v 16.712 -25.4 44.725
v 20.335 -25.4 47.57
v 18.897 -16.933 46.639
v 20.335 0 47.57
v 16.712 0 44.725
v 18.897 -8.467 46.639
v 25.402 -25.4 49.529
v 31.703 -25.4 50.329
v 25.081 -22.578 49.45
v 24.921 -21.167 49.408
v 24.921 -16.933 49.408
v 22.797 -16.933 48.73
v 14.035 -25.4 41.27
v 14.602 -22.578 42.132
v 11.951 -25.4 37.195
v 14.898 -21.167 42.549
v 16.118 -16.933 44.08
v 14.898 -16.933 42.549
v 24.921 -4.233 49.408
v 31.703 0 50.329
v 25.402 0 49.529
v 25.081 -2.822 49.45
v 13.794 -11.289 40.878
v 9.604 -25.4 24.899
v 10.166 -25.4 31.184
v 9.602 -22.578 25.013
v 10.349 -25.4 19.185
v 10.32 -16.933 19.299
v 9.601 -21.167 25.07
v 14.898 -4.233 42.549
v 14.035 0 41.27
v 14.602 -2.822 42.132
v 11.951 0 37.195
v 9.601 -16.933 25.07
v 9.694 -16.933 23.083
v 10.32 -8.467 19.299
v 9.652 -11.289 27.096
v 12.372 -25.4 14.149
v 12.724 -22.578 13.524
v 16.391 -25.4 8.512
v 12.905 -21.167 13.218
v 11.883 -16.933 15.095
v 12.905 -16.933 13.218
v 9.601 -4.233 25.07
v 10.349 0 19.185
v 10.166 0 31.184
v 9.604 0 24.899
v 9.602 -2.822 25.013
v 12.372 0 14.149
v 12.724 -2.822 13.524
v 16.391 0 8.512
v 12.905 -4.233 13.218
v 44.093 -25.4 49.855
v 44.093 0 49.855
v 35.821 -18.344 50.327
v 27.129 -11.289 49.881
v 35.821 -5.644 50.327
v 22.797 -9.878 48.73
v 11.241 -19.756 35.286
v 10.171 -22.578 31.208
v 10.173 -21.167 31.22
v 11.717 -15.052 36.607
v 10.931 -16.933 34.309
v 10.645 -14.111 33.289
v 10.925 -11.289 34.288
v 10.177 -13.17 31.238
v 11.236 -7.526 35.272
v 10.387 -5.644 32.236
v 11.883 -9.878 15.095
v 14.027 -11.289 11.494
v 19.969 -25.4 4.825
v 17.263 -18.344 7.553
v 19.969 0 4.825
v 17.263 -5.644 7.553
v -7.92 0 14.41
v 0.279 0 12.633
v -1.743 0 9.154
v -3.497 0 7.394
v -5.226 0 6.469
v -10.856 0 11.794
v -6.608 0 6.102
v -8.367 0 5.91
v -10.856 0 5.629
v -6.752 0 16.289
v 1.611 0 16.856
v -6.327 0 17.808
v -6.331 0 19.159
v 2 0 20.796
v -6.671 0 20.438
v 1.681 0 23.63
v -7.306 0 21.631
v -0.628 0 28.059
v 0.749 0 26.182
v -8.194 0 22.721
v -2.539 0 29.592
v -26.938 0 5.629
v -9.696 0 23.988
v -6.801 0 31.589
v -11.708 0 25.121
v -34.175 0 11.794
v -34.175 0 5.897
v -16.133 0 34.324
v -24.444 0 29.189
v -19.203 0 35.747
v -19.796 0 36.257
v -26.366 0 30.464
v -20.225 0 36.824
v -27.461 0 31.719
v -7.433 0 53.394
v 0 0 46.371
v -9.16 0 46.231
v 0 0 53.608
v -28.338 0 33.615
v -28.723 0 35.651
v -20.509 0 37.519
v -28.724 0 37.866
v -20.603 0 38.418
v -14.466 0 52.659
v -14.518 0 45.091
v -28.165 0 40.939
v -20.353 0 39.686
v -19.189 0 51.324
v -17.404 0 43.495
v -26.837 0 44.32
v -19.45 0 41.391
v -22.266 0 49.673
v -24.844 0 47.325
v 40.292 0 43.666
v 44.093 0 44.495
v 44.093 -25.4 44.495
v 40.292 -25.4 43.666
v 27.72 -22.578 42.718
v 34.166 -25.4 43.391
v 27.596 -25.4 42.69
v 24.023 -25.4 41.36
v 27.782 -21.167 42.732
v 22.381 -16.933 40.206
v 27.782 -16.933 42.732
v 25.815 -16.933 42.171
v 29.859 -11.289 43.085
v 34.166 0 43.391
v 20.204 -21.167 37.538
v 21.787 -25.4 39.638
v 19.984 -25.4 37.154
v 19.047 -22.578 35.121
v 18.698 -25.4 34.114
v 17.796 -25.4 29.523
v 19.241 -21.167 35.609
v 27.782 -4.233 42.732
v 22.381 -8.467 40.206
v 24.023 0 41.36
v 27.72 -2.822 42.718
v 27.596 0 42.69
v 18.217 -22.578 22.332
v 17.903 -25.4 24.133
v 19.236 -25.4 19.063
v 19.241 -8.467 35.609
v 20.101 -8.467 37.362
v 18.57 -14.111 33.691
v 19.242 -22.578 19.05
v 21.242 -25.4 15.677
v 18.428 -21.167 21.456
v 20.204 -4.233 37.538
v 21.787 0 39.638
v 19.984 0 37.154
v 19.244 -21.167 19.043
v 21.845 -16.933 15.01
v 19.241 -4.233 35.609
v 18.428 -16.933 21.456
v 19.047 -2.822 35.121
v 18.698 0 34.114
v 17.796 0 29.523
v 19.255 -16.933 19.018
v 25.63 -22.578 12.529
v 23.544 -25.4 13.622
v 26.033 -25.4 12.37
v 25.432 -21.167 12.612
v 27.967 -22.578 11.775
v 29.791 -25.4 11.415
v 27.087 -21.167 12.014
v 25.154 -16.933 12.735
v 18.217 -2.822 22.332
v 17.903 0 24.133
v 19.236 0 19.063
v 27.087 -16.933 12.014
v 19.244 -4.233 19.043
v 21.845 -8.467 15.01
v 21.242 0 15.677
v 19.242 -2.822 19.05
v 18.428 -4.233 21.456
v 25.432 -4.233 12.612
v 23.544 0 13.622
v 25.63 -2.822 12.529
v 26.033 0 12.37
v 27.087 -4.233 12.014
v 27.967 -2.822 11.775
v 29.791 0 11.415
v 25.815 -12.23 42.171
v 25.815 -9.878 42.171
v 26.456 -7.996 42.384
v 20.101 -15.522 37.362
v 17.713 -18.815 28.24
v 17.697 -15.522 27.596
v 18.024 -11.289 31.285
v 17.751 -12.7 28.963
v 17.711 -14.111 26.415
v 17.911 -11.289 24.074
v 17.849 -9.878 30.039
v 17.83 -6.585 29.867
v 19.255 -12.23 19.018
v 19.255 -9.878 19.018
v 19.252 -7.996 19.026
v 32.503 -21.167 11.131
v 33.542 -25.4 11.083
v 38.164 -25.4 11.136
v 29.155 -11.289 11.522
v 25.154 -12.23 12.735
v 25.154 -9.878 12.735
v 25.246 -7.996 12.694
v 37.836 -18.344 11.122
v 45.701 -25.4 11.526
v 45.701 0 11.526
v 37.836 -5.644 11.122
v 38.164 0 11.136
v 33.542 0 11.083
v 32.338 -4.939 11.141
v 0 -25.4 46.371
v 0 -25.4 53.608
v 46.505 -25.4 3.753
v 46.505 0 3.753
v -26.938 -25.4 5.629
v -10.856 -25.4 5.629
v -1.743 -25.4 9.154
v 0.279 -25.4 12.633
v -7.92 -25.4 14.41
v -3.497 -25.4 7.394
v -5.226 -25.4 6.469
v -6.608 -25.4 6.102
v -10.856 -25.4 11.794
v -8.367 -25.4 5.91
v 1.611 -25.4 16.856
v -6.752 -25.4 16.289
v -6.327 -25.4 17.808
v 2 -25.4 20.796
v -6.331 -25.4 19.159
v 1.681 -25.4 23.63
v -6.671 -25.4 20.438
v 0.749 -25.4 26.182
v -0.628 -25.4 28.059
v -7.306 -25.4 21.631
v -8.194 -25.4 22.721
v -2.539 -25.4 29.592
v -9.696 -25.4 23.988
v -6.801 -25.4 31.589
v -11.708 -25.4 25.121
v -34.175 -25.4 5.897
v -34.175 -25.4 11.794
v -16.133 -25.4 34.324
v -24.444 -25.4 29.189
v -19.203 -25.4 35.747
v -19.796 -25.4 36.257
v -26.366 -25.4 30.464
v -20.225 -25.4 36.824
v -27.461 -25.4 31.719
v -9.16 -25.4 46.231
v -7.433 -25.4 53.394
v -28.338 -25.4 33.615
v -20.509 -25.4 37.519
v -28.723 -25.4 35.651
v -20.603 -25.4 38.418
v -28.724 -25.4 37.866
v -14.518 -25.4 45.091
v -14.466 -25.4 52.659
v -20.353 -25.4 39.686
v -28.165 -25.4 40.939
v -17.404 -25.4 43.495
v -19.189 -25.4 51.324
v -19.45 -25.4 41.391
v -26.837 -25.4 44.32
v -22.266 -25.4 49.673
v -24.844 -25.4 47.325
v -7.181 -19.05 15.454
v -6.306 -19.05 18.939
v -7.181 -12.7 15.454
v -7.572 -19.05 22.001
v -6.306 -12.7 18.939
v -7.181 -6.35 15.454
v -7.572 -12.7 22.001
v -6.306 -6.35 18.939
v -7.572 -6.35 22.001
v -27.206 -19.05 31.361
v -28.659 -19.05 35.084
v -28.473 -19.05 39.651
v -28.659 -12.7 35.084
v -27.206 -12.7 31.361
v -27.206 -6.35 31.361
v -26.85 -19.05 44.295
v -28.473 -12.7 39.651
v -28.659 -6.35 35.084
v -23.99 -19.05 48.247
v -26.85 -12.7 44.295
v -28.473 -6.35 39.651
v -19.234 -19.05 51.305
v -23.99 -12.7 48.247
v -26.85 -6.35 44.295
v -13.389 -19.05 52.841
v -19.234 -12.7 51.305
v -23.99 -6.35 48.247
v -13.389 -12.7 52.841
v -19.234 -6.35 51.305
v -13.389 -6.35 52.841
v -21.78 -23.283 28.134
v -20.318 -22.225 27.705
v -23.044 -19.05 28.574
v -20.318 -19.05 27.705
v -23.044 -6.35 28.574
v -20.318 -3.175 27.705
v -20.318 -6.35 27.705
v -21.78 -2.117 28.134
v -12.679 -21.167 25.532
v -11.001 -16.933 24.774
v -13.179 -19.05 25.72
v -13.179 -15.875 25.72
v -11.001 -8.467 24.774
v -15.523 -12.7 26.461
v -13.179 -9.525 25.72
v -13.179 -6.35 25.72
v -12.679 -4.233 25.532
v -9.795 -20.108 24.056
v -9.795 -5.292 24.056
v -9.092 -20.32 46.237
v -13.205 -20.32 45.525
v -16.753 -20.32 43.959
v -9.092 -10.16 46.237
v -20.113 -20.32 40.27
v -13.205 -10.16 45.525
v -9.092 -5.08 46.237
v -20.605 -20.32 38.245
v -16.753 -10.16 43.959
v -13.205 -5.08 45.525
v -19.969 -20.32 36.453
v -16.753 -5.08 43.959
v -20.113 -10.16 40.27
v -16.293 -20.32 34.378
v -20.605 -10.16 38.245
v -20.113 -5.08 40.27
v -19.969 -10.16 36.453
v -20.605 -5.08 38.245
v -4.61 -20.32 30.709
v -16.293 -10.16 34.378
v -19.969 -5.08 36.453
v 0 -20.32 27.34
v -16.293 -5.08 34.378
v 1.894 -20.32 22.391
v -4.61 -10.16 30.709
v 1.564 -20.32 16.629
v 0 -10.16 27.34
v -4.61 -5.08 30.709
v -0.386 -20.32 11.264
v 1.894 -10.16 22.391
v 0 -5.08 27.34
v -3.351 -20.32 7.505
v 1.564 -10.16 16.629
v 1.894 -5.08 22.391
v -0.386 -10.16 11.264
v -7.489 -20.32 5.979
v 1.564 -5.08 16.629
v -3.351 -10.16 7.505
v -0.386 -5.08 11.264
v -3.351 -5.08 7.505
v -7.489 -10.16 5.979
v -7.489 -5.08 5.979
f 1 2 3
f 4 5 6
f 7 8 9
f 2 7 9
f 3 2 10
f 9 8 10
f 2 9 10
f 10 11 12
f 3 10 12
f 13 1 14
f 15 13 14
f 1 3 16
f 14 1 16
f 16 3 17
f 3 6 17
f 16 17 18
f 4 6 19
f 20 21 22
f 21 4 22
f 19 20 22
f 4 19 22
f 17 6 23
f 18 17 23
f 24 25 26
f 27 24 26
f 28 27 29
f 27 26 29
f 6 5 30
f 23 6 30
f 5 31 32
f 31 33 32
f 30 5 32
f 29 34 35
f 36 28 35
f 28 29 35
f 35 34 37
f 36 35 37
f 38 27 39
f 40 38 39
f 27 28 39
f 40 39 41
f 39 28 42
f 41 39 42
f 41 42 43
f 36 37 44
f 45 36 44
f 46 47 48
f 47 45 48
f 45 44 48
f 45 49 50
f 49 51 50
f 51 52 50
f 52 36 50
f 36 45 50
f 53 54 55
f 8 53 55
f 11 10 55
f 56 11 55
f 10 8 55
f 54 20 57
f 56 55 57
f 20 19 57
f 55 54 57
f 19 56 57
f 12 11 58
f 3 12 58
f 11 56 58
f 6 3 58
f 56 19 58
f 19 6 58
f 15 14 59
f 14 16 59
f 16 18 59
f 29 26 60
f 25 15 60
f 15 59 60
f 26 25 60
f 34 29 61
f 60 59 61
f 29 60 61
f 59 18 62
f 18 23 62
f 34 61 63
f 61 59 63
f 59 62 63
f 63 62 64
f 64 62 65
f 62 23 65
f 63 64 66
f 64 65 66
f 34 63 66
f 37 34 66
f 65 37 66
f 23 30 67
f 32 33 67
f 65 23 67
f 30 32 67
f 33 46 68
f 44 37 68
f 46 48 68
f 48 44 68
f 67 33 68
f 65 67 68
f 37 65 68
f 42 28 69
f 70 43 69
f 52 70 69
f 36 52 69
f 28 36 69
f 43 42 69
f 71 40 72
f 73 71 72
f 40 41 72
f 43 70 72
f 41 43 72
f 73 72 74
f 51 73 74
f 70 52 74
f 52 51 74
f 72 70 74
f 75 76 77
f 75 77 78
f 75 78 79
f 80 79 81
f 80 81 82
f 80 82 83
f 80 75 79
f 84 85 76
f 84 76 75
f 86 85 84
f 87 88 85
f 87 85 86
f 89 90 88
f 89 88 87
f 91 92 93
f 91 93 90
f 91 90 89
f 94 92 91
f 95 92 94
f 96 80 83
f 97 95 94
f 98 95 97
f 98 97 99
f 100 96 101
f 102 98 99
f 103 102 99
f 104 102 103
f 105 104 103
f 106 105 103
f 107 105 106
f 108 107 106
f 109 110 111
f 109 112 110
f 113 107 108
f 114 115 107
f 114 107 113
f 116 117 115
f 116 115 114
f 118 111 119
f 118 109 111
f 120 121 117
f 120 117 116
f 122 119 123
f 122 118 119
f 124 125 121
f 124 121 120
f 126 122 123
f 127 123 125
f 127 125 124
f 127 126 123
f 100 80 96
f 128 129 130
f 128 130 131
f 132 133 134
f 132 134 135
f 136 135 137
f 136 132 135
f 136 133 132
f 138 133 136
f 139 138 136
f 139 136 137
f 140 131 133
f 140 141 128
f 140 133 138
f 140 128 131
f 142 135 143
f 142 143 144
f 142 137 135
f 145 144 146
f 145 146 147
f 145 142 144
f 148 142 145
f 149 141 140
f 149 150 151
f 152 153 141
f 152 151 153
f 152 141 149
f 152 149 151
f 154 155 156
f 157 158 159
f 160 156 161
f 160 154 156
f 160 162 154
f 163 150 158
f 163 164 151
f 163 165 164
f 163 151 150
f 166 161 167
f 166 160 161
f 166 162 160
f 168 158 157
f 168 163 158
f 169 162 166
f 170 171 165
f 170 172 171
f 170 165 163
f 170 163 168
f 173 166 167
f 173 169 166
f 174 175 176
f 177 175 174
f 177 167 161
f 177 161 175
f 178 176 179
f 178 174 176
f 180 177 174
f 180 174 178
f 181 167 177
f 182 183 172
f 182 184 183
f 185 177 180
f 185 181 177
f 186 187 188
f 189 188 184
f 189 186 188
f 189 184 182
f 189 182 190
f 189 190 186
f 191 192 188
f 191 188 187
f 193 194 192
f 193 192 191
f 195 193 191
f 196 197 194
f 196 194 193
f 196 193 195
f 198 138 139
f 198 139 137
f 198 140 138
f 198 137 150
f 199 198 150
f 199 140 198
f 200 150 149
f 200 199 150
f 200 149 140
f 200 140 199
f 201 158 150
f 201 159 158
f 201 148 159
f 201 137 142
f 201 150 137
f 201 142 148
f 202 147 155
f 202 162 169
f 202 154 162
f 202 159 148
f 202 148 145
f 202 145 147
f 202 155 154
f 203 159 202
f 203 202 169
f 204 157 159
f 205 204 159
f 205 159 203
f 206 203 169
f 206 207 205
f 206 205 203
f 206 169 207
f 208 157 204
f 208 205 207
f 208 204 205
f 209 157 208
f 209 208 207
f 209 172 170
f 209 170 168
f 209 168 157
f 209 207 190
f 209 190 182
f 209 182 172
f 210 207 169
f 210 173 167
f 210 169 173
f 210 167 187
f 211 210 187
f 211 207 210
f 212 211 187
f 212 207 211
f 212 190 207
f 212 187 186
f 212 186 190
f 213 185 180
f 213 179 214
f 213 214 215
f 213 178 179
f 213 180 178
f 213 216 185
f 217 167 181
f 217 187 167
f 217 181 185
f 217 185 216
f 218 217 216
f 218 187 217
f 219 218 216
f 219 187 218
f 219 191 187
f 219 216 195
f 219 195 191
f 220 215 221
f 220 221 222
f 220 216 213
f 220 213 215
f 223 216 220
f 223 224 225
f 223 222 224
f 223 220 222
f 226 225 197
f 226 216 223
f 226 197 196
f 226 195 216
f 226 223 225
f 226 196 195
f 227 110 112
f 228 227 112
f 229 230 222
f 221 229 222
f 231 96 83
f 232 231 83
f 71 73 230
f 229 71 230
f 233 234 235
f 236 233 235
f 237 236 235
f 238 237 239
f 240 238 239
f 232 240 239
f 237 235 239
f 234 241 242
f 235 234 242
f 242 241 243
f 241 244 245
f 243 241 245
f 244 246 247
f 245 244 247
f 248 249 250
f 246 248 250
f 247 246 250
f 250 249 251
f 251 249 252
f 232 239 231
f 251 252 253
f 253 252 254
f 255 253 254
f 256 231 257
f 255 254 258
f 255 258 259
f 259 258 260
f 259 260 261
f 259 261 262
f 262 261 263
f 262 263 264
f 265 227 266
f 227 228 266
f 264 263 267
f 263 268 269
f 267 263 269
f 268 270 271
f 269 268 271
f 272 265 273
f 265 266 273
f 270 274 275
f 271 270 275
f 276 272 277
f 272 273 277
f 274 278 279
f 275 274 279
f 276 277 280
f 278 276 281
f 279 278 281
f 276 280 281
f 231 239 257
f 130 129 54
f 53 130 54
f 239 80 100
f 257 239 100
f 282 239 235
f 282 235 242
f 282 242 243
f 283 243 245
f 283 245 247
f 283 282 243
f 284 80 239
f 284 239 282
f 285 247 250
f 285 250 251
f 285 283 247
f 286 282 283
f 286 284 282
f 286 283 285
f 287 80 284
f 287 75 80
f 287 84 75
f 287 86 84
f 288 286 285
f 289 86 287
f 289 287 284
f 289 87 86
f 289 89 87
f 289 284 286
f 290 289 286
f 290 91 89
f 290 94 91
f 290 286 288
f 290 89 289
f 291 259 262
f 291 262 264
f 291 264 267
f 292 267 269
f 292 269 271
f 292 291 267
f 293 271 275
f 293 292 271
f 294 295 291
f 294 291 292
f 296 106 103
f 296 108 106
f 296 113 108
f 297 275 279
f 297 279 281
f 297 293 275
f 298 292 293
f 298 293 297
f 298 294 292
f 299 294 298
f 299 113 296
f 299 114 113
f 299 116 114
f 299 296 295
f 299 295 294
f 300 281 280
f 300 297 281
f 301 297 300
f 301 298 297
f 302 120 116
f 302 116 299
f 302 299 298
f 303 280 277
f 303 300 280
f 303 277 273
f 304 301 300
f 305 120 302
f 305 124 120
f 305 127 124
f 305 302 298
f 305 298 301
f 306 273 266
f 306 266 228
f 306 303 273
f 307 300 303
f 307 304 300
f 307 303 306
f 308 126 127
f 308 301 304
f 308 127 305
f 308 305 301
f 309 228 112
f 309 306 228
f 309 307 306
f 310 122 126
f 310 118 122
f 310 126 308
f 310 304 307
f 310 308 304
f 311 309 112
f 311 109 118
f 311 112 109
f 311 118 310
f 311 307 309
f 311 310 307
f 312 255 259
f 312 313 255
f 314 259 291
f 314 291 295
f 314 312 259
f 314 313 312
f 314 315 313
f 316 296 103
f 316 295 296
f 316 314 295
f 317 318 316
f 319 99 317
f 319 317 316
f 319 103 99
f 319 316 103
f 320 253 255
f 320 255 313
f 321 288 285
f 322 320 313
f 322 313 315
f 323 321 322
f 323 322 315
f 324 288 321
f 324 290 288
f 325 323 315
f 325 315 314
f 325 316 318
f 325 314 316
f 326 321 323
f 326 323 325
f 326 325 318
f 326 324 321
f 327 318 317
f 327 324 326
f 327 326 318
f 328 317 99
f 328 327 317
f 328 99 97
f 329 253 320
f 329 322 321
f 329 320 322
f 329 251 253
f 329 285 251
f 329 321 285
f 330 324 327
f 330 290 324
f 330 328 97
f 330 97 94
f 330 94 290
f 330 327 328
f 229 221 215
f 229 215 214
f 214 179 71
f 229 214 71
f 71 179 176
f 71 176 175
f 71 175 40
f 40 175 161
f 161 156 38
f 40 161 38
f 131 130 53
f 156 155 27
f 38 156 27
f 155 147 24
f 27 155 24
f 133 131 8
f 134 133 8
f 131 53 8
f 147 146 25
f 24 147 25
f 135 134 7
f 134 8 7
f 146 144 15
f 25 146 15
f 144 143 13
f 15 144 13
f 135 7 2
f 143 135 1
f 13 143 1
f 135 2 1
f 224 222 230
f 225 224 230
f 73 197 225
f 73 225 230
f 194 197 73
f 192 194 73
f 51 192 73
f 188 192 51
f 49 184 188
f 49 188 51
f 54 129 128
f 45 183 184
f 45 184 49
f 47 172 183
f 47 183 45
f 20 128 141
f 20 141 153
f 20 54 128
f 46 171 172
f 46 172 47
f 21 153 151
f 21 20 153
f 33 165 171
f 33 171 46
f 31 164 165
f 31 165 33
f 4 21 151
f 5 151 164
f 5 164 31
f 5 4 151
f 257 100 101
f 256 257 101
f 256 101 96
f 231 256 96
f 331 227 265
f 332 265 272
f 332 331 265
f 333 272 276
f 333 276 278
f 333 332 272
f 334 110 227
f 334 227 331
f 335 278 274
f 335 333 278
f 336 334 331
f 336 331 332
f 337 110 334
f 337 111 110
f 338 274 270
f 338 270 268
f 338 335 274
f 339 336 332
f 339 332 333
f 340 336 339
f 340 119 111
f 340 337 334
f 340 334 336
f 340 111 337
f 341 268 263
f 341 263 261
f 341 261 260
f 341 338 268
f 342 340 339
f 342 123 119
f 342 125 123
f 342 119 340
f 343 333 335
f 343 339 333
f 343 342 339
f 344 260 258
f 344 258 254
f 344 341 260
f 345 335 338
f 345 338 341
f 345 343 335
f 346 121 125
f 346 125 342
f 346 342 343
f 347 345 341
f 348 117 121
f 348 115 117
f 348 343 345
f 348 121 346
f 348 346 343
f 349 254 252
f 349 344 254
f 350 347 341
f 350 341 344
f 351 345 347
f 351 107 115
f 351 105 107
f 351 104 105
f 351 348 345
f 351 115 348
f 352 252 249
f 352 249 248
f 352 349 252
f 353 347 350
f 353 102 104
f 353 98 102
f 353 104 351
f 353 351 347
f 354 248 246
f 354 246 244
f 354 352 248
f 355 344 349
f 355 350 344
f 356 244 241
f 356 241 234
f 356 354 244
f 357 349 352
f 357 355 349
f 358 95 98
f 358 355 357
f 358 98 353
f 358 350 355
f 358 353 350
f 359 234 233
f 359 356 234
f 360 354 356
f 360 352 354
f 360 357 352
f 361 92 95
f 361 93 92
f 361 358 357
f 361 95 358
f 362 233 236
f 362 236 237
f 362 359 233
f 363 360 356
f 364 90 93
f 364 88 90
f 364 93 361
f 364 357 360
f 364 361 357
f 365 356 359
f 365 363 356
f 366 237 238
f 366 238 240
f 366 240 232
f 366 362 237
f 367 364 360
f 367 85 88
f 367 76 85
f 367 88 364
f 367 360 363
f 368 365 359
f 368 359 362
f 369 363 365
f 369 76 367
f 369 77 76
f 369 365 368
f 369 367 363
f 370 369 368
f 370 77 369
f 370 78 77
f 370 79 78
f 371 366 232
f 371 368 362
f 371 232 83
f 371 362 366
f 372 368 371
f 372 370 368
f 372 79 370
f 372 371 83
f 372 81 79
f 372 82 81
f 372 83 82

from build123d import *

# Parameters (mm, degrees)
F1_DEPTH = 25.4
F3_DEPTH = 25.4


with BuildPart() as f1:
    # F0 (on Front) → F1 (new body)
    with BuildSketch(Plane.XZ):
        with BuildLine():
            add(Edge.make_bspline(
                [(0, 46.3709570467), (-6.1704137796, 46.4338267672), (-16.880098013, 46.9796939573), (-24.9064240431, 32.914558963), (7.6871024421, 33.2195113159), (-1.0140436342, 4.1411499506), (-9.1814069554, 6.1720389553), (-10.8556281775, 5.6288442574)],
                knots=[0, 0, 0, 0, 0.2174080044, 0.3684139911, 0.6160005651, 0.8530165487, 1, 1, 1, 1], degree=3))
            Line((0, 46.3709570467), (0, 53.6080412567))
            add(Edge.make_bspline(
                [(-10.8556281775, 11.7937689647), (-3.796067061, 16.6811583734), (-8.5661210075, 27.8757531743), (-32.1648526785, 26.8040013399), (-26.4035945954, 53.7751090546), (-9.1579540297, 53.3679242262), (0, 53.6080412567)],
                knots=[0, 0, 0, 0, 0.2097543009, 0.4622255601, 0.7071348093, 1, 1, 1, 1], degree=3))
            Line((-10.8556281775, 11.7937689647), (-26.9380398095, 11.7937689647))
            Line((-26.9380398095, 11.7937689647), (-34.1751277447, 11.7937689647))
            Line((-34.1751277447, 11.7937689647), (-34.1751277447, 5.8968844824))
            Line((-34.1751277447, 5.8968844824), (-26.9380398095, 5.6288442574))
            Line((-26.9380398095, 5.6288442574), (-10.8556281775, 5.6288442574))
        make_face()
    extrude(amount=F1_DEPTH)


with BuildPart() as f3:
    # F2 (on Front) → F3 (new body)
    with BuildSketch(Plane.XZ):
        with BuildLine():
            add(Edge.make_bspline(
                [(44.0926142037, 44.4946736097), (38.5963105044, 42.2626423132), (16.6860225713, 48.170913261), (15.7616386718, 7.0777469726), (38.9656480147, 11.4415274382), (45.7008555532, 11.5257296711)],
                knots=[0, 0, 0, 0, 0.3214550257, 0.6644872651, 1, 1, 1, 1], degree=3))
            Line((44.0926142037, 44.4946736097), (44.0926142037, 49.8554781079))
            add(Edge.make_bspline(
                [(44.0926142037, 49.8554781079), (36.3092318839, 50.2617346323), (14.7902139993, 53.2783689014), (5.2432626211, 18.4839159713), (17.5216751274, 7.2500344641), (19.9689920992, 4.8247235827)],
                knots=[0, 0, 0, 0, 0.3460583244, 0.7136136814, 1, 1, 1, 1], degree=3))
            Line((19.9689920992, 4.8247235827), (46.5049743652, 3.7525629159))
            Line((46.5049743652, 3.7525629159), (45.7008555532, 11.5257296711))
        make_face()
    extrude(amount=F3_DEPTH)


solid = Compound([f1.part, f3.part])
